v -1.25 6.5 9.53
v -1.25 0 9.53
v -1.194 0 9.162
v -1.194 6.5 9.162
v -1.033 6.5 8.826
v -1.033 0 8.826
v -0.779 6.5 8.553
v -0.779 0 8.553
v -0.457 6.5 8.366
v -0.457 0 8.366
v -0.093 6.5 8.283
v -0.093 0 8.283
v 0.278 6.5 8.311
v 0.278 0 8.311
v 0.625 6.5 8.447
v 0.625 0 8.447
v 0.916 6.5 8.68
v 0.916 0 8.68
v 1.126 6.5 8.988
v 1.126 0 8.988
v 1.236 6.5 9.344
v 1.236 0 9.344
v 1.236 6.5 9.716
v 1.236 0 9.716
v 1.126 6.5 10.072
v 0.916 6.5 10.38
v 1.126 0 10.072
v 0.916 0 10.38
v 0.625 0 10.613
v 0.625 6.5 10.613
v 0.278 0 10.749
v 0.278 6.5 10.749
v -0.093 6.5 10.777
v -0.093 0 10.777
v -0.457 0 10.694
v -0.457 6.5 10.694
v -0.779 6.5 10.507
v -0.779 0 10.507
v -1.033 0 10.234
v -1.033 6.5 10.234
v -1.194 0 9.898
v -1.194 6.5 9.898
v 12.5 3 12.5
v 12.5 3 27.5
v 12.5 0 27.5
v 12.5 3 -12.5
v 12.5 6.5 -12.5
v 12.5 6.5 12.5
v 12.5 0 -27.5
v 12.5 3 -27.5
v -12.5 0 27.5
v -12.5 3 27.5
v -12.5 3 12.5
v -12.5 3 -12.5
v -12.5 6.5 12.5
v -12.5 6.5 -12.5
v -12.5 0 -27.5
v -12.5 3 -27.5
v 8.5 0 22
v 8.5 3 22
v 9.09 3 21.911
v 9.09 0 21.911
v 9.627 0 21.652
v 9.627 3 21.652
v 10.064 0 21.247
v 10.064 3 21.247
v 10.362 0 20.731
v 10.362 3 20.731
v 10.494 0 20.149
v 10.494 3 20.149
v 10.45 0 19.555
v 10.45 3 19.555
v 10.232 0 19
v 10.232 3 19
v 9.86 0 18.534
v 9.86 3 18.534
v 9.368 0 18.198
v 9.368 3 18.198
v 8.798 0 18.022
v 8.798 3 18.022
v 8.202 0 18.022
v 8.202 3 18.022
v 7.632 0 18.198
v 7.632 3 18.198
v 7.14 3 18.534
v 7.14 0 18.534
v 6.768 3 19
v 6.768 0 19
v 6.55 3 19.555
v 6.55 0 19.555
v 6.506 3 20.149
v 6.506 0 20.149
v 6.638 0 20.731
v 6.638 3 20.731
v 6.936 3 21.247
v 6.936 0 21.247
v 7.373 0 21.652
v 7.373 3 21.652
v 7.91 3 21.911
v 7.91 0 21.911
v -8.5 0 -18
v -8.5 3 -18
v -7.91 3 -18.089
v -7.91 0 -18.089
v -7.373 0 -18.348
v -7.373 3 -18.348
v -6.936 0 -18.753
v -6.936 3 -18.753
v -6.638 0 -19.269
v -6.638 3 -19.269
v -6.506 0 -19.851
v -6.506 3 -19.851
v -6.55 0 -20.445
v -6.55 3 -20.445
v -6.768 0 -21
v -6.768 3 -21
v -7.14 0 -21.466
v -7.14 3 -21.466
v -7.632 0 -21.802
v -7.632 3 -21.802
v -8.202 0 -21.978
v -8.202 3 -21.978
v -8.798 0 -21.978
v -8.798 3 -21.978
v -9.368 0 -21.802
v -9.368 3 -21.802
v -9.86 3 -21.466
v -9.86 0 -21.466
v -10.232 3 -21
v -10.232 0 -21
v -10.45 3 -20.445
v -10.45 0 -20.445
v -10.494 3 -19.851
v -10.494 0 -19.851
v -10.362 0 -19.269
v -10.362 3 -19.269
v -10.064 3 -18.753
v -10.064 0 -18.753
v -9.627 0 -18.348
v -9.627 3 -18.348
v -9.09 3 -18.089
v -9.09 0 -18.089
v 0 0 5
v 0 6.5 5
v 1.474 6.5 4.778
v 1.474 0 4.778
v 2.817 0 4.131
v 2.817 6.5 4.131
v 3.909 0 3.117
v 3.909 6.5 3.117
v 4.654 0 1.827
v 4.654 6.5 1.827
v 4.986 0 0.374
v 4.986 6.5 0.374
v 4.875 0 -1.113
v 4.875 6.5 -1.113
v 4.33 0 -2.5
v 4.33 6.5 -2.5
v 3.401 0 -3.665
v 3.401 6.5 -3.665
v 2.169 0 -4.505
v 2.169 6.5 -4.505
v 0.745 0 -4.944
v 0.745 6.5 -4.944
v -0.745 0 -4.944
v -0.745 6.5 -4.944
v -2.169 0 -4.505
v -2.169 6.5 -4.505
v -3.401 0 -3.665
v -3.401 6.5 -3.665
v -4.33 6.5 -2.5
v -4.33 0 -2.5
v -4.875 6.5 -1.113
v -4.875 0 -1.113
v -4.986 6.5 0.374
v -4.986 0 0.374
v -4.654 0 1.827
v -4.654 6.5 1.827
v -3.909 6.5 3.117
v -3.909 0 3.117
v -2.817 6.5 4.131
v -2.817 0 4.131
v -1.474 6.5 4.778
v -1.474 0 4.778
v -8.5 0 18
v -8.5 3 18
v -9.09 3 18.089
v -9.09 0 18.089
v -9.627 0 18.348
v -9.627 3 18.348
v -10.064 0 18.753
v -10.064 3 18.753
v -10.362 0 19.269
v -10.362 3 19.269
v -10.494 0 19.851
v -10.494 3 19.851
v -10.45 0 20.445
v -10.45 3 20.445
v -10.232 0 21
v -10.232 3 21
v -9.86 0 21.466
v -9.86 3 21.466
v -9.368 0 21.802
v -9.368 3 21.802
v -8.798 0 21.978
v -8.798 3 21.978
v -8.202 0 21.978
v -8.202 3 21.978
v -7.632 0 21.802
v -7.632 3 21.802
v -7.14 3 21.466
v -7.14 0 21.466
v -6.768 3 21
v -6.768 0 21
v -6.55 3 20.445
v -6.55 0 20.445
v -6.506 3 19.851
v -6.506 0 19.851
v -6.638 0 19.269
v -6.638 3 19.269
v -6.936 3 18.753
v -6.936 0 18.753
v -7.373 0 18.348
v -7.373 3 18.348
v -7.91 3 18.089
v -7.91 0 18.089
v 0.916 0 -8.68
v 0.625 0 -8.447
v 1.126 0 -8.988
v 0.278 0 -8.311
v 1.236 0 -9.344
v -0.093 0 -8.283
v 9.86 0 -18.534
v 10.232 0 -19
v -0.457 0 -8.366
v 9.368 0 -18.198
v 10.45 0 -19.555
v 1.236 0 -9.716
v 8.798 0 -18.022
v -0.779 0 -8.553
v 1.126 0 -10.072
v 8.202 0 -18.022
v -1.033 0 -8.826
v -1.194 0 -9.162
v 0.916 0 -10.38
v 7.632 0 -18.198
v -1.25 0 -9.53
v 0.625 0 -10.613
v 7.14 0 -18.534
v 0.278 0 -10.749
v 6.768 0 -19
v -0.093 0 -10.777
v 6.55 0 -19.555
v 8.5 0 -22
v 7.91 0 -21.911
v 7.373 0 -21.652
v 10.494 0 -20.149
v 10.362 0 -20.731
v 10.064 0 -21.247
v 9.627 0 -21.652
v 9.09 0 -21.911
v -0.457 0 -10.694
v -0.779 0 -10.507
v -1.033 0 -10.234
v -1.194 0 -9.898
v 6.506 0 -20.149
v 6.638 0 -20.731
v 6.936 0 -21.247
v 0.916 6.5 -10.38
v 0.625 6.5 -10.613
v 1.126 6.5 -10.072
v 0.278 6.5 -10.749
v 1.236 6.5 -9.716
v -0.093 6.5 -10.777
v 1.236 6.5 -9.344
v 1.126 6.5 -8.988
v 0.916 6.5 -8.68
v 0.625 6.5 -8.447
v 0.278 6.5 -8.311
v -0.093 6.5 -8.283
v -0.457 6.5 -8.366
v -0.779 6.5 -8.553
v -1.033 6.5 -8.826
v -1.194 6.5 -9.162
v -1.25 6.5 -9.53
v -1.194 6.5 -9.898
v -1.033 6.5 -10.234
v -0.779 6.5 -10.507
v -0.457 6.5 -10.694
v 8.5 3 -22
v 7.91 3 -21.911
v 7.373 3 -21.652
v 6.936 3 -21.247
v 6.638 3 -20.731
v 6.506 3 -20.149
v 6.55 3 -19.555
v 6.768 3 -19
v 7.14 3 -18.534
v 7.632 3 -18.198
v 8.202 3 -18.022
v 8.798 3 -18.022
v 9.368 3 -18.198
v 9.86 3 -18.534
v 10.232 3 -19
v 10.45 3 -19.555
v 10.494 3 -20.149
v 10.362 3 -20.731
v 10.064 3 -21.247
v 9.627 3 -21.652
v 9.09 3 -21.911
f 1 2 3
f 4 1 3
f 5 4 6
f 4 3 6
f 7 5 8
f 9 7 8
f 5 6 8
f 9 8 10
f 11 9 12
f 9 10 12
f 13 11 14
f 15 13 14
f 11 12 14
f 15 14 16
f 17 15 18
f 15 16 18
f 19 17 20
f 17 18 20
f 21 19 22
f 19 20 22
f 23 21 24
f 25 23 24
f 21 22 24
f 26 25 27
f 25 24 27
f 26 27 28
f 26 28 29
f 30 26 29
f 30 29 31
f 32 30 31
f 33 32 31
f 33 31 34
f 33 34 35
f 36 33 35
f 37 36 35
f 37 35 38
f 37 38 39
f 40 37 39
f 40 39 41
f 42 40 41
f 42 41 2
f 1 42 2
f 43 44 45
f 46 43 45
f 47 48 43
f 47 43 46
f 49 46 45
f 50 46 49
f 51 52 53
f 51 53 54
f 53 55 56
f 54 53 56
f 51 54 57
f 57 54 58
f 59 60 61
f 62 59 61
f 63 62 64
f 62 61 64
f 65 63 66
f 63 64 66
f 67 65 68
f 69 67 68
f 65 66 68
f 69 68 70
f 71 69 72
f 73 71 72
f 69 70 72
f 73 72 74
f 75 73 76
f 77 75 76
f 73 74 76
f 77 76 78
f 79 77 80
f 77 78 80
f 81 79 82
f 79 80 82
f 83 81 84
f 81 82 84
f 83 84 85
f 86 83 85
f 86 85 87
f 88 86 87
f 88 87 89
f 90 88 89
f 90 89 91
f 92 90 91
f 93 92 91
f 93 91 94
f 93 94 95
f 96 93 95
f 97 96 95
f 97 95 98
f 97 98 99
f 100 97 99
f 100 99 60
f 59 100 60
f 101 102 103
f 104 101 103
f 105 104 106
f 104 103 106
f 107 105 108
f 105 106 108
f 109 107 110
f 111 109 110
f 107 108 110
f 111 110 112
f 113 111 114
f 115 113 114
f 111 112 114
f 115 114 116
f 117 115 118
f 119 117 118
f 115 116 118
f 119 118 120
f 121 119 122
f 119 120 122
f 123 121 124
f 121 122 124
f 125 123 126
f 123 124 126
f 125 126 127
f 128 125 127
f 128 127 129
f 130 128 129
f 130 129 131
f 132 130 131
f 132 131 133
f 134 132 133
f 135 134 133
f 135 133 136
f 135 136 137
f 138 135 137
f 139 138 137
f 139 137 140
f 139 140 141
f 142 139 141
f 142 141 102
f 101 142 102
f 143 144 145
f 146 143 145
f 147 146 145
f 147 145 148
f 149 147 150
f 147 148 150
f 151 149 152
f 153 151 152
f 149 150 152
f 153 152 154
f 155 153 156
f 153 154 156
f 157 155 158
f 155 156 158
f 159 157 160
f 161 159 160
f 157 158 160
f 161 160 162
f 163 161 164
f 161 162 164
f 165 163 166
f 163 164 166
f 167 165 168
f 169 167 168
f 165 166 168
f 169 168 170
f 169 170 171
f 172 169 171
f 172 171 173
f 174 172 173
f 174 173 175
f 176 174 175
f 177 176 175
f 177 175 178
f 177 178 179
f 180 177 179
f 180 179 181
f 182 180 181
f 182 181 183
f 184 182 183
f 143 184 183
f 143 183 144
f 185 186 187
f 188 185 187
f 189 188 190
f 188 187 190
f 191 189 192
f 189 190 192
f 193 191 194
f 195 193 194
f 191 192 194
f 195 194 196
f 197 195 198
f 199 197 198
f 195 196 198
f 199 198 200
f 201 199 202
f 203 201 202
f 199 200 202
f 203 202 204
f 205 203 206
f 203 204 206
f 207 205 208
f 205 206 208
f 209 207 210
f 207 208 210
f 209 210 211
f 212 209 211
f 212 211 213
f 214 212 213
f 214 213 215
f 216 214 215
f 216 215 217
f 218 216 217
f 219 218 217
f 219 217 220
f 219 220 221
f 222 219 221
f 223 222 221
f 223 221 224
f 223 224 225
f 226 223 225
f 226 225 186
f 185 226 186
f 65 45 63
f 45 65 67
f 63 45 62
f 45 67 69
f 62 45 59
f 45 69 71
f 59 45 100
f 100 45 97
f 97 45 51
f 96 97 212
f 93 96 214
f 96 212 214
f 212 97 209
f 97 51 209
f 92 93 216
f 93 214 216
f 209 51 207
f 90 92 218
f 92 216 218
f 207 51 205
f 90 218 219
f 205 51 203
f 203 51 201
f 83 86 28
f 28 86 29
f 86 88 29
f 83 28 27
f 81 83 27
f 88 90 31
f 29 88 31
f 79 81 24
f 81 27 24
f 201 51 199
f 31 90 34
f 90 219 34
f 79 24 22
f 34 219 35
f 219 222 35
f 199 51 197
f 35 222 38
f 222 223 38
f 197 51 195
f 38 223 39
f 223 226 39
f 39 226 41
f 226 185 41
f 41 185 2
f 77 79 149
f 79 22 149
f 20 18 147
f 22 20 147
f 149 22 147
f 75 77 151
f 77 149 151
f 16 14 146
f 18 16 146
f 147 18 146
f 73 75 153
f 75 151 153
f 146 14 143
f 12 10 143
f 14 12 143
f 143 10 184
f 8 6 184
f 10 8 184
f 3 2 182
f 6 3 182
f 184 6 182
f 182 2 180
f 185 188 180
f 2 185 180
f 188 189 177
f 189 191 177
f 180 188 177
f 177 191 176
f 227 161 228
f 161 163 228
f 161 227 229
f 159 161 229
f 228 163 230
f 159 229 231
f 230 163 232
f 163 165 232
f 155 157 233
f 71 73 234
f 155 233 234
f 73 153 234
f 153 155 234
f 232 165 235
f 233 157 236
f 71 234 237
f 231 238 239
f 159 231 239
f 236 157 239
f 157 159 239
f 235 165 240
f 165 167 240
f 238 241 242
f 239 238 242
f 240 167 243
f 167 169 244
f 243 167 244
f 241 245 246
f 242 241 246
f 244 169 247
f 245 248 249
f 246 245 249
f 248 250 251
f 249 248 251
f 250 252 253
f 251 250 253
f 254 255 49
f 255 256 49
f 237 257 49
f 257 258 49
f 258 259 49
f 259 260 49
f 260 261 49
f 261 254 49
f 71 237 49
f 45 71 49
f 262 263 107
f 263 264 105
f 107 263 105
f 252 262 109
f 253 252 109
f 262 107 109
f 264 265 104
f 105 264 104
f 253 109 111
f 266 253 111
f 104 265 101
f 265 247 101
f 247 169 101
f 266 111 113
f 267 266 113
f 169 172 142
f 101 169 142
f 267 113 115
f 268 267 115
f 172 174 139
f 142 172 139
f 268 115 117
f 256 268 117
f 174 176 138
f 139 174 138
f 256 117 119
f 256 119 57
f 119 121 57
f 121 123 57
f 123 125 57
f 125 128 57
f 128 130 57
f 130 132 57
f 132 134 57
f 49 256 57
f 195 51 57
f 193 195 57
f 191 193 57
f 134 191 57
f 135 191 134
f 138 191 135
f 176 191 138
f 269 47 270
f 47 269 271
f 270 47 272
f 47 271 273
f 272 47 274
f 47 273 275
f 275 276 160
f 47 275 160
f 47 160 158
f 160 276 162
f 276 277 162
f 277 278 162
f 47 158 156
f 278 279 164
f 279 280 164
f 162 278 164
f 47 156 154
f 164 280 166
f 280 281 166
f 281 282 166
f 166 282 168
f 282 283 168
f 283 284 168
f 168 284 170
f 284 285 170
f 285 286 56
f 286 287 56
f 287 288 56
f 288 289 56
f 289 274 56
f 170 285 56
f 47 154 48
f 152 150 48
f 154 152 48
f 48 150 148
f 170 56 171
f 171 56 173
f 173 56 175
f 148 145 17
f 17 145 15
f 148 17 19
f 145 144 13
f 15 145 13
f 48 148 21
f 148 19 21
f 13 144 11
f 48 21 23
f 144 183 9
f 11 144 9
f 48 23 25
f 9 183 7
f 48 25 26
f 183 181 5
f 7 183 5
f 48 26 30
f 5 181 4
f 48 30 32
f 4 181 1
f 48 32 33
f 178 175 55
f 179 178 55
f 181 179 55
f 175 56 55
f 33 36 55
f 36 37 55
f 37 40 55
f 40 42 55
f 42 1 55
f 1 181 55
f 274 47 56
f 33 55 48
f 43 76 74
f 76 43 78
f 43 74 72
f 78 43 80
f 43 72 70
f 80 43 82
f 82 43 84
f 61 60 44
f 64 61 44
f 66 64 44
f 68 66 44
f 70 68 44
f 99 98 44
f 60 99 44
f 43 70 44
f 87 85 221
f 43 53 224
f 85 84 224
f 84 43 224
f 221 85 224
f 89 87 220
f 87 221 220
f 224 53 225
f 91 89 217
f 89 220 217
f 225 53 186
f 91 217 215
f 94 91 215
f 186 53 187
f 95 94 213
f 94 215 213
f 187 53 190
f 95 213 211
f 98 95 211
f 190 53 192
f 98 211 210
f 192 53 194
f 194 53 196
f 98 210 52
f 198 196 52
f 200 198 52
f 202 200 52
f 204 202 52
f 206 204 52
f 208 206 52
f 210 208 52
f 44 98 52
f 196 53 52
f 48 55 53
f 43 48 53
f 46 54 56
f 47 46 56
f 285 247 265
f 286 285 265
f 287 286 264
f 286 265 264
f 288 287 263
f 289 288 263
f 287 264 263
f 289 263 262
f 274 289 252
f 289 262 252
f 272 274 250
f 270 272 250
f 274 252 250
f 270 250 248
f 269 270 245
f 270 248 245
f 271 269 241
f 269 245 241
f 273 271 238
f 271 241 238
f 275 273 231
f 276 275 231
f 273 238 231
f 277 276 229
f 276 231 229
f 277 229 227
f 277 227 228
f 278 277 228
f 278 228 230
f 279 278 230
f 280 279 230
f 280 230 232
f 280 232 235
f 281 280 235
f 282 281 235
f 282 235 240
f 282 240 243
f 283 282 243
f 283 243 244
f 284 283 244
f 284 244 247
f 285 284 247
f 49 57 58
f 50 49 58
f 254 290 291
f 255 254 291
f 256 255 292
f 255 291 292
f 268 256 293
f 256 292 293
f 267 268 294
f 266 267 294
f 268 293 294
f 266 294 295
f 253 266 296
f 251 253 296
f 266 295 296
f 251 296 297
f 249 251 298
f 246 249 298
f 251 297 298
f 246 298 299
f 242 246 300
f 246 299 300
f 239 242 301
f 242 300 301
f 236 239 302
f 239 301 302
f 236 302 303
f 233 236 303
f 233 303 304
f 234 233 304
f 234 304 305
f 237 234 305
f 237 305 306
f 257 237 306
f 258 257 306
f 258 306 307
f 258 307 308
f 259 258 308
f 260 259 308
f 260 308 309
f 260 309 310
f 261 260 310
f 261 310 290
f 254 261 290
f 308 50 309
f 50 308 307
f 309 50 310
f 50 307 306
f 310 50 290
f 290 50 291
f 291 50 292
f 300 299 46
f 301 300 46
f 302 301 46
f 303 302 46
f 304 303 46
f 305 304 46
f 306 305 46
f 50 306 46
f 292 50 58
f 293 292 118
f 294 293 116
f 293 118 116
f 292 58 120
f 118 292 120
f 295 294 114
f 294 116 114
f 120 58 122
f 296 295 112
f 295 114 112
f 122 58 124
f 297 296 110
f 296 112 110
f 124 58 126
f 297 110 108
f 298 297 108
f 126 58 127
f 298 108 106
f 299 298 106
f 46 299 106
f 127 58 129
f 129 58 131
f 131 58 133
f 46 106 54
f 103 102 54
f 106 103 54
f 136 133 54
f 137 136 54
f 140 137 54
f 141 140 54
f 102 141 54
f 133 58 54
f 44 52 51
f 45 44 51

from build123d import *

# Parameters (mm, degrees)
BOSS_EXTRUDE1_DEPTH         = 12.5
BOSS_EXTRUDE1_DEPTH_BACK    = 12.5
SKETCH4_R                   = 2
CUT_EXTRUDE2_DEPTH          = 31.409702399
CUT_EXTRUDE3_REACH          = 32.899
SKETCH7_R                   = 5
TAP_DRILL_FOR_M3X0_5_TAP2_D = 2.5


with BuildPart() as part:
    # Sketch2 → Boss-Extrude1 (new, two sides: drawn at the far end of the back side and taken through both)
    with BuildSketch(Plane(origin=(0, 0, 0), x_dir=(0, 0, -1), z_dir=(1, 0, 0)).offset(-BOSS_EXTRUDE1_DEPTH_BACK)):
        Polygon((0, 0), (27.5, 0), (27.5, 3), (12.5, 3), (12.5, 6.5), (-12.5, 6.5), (-12.5, 3), (-27.5, 3), (-27.5, 0), align=None)
    extrude(amount=BOSS_EXTRUDE1_DEPTH + BOSS_EXTRUDE1_DEPTH_BACK)

    # Sketch4 → Cut-Extrude2 (cut, through all)
    with BuildSketch(Plane(origin=(0, 3, 0), x_dir=(1, 0, 0), z_dir=(0, 1, 0))):
        with Locations(Location((-8.5, 20, 0), (0, 0, 270))):
            Circle(SKETCH4_R)
        with Locations(Location((8.5, 20, 0), (0, 0, 90))):
            Circle(SKETCH4_R)
        with Locations(Location((8.5, -20, 0), (0, 0, 270))):
            Circle(SKETCH4_R)
        with Locations(Location((-8.5, -20, 0), (0, 0, 90))):
            Circle(SKETCH4_R)
    extrude(amount=-CUT_EXTRUDE2_DEPTH, mode=Mode.SUBTRACT)

    # Sketch7 → Cut-Extrude3 (cut, up to next)
    with BuildSketch(Plane(origin=(0, 6.5, 0), x_dir=(1, 0, 0), z_dir=(0, 1, 0)), mode=Mode.PRIVATE) as cut_extrude3_sk1:
        with Locations(Location((0, 0, 0), (0, 0, 270))):
            Circle(SKETCH7_R)
    cut_extrude3_tool1 = extrude(cut_extrude3_sk1.sketch, amount=-CUT_EXTRUDE3_REACH, mode=Mode.PRIVATE) & part.part
    add(cut_extrude3_tool1.solids().sort_by_distance((0, 6.5, 0))[0], mode=Mode.SUBTRACT)

    # Tap Drill for M3x0.5 Tap2 (through all)
    with Locations(Plane(origin=(0, 6.5, 0), x_dir=(1, 0, 0), z_dir=(0, 1, 0))):
        with Locations((0, 9.53), (0, -9.53)):
            Hole(TAP_DRILL_FOR_M3X0_5_TAP2_D / 2)


solid = part.part
